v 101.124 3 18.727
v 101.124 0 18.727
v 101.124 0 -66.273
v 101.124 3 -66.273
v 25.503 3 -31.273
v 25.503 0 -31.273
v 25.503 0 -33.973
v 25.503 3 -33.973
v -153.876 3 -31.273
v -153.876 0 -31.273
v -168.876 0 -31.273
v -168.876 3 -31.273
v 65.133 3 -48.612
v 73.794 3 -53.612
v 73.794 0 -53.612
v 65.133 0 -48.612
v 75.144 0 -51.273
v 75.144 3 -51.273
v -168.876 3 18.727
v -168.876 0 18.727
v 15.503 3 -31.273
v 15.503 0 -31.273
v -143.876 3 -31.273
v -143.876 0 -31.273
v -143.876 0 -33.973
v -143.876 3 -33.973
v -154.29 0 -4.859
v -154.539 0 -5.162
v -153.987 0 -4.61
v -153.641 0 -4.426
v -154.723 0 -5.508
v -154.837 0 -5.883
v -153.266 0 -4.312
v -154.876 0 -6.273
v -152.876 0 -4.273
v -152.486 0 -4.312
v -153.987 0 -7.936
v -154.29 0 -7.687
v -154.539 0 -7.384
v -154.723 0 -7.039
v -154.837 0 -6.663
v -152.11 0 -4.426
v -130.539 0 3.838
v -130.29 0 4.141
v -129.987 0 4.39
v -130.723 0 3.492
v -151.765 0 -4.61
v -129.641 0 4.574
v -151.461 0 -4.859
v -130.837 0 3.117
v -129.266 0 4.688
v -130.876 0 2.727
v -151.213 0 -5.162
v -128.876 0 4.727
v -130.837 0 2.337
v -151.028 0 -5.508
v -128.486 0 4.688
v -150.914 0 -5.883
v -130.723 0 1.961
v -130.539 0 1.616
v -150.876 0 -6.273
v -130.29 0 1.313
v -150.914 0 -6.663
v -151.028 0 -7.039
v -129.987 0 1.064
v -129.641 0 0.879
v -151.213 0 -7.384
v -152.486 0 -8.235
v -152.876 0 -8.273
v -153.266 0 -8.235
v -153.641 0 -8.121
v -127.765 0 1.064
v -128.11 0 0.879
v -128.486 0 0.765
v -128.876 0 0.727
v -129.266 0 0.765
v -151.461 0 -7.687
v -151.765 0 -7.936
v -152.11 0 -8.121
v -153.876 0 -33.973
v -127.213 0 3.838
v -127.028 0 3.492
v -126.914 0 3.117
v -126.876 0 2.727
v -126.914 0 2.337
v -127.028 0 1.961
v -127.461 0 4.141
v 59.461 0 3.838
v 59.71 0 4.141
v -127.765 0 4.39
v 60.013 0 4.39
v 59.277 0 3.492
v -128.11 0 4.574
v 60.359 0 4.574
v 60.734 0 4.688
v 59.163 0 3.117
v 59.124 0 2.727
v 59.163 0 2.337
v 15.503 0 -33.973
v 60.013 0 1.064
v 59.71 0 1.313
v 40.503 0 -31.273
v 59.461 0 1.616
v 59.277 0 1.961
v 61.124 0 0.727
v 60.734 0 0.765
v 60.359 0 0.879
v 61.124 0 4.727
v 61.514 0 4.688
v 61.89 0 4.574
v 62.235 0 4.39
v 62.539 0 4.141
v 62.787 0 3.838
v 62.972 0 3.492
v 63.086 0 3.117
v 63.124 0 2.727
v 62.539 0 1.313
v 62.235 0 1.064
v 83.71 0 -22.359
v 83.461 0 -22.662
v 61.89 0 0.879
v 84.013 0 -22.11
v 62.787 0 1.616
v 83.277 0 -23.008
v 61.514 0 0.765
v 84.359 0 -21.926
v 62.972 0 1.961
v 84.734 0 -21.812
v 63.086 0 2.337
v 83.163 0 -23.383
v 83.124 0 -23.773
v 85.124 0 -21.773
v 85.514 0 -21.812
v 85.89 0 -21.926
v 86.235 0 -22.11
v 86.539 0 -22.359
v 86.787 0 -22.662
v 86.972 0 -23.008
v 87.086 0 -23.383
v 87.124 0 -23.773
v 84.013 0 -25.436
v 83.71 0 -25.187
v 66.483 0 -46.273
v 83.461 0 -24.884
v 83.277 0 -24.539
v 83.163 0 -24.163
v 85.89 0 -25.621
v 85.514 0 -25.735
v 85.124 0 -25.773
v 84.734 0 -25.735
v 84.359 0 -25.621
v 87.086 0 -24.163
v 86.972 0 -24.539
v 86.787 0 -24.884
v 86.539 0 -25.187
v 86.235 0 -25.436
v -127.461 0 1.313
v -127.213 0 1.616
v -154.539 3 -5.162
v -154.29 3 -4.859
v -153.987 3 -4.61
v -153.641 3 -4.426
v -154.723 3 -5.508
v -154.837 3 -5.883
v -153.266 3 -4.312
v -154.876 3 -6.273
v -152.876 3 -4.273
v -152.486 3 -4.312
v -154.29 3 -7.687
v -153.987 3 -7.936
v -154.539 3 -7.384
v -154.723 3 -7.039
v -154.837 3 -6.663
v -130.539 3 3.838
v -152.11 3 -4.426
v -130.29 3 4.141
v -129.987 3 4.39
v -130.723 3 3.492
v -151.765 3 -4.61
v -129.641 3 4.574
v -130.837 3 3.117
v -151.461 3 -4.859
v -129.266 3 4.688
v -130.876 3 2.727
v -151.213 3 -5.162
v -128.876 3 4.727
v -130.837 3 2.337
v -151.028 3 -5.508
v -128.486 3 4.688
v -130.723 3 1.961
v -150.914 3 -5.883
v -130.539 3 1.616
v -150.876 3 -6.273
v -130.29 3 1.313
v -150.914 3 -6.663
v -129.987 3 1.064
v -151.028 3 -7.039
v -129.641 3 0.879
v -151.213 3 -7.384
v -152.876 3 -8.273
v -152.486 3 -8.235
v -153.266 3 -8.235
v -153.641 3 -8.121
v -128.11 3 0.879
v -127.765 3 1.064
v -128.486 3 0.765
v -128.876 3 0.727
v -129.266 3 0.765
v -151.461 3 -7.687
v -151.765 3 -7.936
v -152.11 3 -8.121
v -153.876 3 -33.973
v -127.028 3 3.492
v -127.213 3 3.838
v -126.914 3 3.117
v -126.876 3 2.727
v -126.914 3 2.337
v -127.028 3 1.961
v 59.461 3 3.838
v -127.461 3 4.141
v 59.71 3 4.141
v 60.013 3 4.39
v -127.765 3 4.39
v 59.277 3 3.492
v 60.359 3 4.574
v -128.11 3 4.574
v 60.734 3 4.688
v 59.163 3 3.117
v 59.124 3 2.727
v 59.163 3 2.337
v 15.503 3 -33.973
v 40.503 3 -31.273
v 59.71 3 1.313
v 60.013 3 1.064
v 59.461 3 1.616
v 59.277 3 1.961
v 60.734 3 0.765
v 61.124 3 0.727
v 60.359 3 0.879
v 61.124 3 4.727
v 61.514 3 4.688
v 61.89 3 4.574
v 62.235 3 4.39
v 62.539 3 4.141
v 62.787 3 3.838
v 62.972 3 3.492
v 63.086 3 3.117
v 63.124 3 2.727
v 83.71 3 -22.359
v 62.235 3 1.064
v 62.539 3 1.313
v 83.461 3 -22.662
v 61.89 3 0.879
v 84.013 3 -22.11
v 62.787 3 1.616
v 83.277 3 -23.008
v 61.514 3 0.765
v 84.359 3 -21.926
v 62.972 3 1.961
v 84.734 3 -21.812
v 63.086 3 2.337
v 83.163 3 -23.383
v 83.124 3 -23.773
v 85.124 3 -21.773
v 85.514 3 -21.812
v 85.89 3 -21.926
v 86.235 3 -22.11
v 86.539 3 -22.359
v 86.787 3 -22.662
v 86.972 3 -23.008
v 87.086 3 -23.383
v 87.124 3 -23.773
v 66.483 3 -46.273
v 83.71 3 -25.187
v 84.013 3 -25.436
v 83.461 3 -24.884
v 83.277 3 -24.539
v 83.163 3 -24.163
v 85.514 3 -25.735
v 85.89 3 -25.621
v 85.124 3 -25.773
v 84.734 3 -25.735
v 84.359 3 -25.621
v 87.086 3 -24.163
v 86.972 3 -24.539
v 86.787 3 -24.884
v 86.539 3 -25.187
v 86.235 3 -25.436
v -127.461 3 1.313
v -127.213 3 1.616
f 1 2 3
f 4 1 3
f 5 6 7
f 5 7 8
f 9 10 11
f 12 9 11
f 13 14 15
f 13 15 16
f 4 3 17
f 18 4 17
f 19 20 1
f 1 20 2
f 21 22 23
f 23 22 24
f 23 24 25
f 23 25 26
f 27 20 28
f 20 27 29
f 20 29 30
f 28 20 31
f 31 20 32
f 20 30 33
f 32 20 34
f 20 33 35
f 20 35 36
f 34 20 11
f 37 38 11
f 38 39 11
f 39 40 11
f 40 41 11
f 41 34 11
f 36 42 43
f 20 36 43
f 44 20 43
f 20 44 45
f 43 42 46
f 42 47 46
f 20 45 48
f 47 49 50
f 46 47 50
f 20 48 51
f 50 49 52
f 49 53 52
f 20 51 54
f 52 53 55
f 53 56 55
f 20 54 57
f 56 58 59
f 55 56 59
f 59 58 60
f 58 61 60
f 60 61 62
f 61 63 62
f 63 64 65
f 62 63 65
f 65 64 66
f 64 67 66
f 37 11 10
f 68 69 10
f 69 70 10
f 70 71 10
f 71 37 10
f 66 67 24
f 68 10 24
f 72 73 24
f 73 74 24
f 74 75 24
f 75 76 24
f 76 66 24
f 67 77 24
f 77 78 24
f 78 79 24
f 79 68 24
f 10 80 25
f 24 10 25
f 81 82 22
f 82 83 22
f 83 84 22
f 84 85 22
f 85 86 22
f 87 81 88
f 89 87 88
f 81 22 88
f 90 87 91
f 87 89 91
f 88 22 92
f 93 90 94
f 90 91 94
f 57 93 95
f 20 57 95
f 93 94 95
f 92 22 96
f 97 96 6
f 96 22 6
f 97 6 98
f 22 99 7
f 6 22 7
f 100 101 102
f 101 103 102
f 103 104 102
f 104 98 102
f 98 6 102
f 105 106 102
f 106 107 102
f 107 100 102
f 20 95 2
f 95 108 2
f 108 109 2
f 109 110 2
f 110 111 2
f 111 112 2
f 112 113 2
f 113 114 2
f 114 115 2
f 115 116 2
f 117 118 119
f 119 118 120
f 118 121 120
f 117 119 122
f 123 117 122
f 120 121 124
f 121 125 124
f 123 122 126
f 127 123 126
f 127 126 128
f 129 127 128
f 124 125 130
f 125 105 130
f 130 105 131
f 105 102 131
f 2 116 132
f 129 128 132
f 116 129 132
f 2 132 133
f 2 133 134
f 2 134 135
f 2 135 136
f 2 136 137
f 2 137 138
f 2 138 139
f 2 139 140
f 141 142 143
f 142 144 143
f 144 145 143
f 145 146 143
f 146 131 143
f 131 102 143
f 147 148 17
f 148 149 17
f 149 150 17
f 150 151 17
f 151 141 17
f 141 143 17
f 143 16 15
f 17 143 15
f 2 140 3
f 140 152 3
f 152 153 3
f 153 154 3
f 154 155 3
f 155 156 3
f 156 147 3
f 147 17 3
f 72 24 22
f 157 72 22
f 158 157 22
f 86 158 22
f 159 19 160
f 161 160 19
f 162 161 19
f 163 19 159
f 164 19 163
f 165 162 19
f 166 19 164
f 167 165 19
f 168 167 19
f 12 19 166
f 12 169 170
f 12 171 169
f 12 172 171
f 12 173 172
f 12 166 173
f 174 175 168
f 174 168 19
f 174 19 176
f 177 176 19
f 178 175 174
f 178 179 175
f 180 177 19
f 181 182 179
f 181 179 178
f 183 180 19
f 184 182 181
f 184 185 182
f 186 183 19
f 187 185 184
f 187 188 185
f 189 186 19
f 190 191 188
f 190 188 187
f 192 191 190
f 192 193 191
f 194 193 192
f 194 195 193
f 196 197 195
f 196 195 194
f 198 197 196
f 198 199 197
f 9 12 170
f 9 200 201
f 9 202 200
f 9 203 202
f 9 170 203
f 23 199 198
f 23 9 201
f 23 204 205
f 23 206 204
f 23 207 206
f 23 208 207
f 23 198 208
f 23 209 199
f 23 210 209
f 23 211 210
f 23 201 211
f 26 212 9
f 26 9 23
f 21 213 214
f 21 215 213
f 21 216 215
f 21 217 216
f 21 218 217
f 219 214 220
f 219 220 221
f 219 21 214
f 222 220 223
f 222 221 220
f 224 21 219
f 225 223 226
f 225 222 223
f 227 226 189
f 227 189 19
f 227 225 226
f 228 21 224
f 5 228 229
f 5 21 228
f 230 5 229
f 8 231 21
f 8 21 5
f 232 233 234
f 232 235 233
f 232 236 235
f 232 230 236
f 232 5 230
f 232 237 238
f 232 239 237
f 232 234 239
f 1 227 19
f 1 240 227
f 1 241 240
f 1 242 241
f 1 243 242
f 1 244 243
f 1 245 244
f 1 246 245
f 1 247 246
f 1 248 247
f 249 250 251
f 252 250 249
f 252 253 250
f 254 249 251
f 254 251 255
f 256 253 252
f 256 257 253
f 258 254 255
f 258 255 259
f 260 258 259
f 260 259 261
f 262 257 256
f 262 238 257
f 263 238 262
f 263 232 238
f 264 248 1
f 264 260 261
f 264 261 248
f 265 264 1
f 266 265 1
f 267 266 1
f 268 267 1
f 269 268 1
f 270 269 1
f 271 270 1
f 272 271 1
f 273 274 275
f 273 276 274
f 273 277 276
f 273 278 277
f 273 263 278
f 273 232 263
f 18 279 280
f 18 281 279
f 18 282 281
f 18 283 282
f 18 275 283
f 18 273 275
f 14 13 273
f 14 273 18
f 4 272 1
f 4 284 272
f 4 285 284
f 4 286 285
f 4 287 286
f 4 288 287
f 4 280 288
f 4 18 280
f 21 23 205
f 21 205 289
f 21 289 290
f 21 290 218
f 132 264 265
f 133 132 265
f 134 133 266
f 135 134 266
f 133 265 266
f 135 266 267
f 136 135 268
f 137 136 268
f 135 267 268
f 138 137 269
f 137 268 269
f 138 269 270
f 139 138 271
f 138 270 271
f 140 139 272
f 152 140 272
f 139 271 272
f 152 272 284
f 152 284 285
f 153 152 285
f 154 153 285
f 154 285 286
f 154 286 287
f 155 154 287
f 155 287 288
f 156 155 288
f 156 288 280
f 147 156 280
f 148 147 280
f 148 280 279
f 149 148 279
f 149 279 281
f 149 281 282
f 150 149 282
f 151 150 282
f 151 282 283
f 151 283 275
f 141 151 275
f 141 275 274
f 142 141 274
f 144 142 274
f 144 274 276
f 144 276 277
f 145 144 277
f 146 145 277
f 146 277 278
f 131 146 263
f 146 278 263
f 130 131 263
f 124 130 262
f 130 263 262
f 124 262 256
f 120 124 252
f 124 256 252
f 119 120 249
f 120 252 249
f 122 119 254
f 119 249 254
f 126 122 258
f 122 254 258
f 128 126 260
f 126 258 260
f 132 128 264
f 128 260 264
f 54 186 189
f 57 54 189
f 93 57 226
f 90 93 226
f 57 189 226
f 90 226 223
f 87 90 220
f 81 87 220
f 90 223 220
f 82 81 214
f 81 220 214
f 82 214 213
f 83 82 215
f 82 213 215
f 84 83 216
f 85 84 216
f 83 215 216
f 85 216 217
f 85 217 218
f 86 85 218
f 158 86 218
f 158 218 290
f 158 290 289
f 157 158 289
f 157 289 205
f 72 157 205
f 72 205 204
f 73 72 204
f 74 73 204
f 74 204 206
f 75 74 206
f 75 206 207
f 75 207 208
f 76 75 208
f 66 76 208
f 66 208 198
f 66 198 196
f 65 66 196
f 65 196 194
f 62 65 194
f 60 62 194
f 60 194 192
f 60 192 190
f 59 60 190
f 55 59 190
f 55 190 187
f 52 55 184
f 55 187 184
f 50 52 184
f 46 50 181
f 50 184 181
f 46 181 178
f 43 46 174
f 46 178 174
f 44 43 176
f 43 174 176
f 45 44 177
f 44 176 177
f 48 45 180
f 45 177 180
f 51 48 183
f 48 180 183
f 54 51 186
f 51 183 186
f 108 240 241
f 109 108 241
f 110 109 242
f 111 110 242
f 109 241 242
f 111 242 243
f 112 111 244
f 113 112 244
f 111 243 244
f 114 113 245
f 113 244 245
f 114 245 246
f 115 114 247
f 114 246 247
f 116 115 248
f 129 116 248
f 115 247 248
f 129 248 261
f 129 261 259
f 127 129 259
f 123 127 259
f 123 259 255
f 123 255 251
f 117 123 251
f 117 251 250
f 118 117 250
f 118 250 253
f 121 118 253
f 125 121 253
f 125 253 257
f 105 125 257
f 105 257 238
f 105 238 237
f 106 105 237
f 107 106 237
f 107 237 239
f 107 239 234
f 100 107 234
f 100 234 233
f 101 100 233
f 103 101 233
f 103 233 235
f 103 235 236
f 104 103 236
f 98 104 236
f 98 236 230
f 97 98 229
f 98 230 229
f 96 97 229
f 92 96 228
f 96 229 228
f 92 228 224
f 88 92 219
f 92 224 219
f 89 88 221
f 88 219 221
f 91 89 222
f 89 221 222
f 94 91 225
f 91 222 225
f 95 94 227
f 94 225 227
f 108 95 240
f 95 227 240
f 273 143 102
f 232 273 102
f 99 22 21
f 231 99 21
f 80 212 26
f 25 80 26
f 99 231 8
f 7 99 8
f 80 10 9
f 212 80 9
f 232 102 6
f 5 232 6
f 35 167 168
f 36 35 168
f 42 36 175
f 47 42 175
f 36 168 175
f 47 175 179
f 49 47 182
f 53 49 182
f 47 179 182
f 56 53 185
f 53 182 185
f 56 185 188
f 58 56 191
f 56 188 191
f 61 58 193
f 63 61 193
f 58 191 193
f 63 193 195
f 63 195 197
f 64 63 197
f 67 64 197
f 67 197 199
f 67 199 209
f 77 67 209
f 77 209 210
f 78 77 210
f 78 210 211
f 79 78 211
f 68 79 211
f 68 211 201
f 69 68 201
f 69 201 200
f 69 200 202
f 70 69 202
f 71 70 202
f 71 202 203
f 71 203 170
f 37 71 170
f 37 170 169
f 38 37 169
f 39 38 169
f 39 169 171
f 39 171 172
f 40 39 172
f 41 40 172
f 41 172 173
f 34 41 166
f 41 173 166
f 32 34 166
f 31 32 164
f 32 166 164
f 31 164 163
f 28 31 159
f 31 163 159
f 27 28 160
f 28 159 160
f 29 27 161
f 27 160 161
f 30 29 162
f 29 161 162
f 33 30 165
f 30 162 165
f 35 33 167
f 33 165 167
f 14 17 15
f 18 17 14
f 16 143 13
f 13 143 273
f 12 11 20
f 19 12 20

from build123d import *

# Parameters (mm, degrees)
BOSS_EXTRUDE1_DEPTH = 3
CUT_EXTRUDE1_REACH  = 5
SKETCH2_R           = 2
CUT_EXTRUDE2_REACH  = 5
SKETCH3_R           = 2
SKETCH4_W           = 10
SKETCH4_H           = 3
BOSS_EXTRUDE3_DEPTH = 2.7
SKETCH5_W           = 10
SKETCH5_H           = 3
BOSS_EXTRUDE4_DEPTH = 2.7


with BuildPart() as part:
    # Sketch1 → Boss-Extrude1 (new body)
    with BuildSketch(Plane(origin=(0, 0, 0), x_dir=(1, 0, 0), z_dir=(0, 1, 0))):
        Polygon((101.124303582, 11.213732055), (101.124303582, 66.273277114), (40.502525317, 31.273277114), (-168.875696418, 31.273277114), (-168.875696418, -18.726722886), (101.124303582, -18.726722886), align=None)
    extrude(amount=BOSS_EXTRUDE1_DEPTH)

    # Sketch2 → Cut-Extrude1 (cut, up to next)
    with BuildSketch(Plane(origin=(0, 3, 0), x_dir=(1, 0, 0), z_dir=(0, 1, 0)), mode=Mode.PRIVATE) as cut_extrude1_sk1:
        with Locations(Location((-152.875696418, 6.273277114, 0), (0, 0, 270))):  # turned: the seam where the file's is
            Circle(SKETCH2_R)
    cut_extrude1_tool1 = extrude(cut_extrude1_sk1.sketch, amount=-CUT_EXTRUDE1_REACH, mode=Mode.PRIVATE) & part.part
    add(cut_extrude1_tool1.solids().sort_by_distance((-152.875696, 3, -6.273277))[0], mode=Mode.SUBTRACT)
    # Sketch2 → Cut-Extrude1 (cut, up to next)
    with BuildSketch(Plane(origin=(0, 3, 0), x_dir=(1, 0, 0), z_dir=(0, 1, 0)), mode=Mode.PRIVATE) as cut_extrude1_sk2:
        with Locations(Location((85.124303582, 23.773277114, 0), (0, 0, 270))):  # turned: the seam where the file's is
            Circle(SKETCH2_R)
    cut_extrude1_tool2 = extrude(cut_extrude1_sk2.sketch, amount=-CUT_EXTRUDE1_REACH, mode=Mode.PRIVATE) & part.part
    add(cut_extrude1_tool2.solids().sort_by_distance((85.124304, 3, -23.773277))[0], mode=Mode.SUBTRACT)

    # Sketch3 → Cut-Extrude2 (cut, up to next)
    with BuildSketch(Plane(origin=(0, 3, 0), x_dir=(1, 0, 0), z_dir=(0, 1, 0)), mode=Mode.PRIVATE) as cut_extrude2_sk1:
        with Locations(Location((-128.875696418, -2.726722886, 0), (0, 0, 270))):  # turned: the seam where the file's is
            Circle(SKETCH3_R)
    cut_extrude2_tool1 = extrude(cut_extrude2_sk1.sketch, amount=-CUT_EXTRUDE2_REACH, mode=Mode.PRIVATE) & part.part
    add(cut_extrude2_tool1.solids().sort_by_distance((-128.875696, 3, 2.726723))[0], mode=Mode.SUBTRACT)
    # Sketch3 → Cut-Extrude2 (cut, up to next)
    with BuildSketch(Plane(origin=(0, 3, 0), x_dir=(1, 0, 0), z_dir=(0, 1, 0)), mode=Mode.PRIVATE) as cut_extrude2_sk2:
        with Locations(Location((61.124303582, -2.726722886, 0), (0, 0, 270))):  # turned: the seam where the file's is
            Circle(SKETCH3_R)
    cut_extrude2_tool2 = extrude(cut_extrude2_sk2.sketch, amount=-CUT_EXTRUDE2_REACH, mode=Mode.PRIVATE) & part.part
    add(cut_extrude2_tool2.solids().sort_by_distance((61.124304, 3, 2.726723))[0], mode=Mode.SUBTRACT)

    # Sketch4 → Boss-Extrude3 (add)
    with BuildSketch(Plane.XY.offset(-31.273277114)):
        with Locations((-148.875696418, 1.5)):
            Rectangle(SKETCH4_W, SKETCH4_H)
        with Locations((20.502525317, 1.5)):
            Rectangle(SKETCH4_W, SKETCH4_H)
    extrude(amount=-BOSS_EXTRUDE3_DEPTH)

    # Sketch5 → Boss-Extrude4 (add)
    with BuildSketch(Plane(origin=(-3.416094891, 0, -5.916849915), x_dir=(-0.866025404, 0, 0.5), z_dir=(-0.5, 0, -0.866025404))):
        with Locations((-85.712854399, 1.5)):
            Rectangle(SKETCH5_W, SKETCH5_H)
    extrude(amount=BOSS_EXTRUDE4_DEPTH)


solid = part.part
